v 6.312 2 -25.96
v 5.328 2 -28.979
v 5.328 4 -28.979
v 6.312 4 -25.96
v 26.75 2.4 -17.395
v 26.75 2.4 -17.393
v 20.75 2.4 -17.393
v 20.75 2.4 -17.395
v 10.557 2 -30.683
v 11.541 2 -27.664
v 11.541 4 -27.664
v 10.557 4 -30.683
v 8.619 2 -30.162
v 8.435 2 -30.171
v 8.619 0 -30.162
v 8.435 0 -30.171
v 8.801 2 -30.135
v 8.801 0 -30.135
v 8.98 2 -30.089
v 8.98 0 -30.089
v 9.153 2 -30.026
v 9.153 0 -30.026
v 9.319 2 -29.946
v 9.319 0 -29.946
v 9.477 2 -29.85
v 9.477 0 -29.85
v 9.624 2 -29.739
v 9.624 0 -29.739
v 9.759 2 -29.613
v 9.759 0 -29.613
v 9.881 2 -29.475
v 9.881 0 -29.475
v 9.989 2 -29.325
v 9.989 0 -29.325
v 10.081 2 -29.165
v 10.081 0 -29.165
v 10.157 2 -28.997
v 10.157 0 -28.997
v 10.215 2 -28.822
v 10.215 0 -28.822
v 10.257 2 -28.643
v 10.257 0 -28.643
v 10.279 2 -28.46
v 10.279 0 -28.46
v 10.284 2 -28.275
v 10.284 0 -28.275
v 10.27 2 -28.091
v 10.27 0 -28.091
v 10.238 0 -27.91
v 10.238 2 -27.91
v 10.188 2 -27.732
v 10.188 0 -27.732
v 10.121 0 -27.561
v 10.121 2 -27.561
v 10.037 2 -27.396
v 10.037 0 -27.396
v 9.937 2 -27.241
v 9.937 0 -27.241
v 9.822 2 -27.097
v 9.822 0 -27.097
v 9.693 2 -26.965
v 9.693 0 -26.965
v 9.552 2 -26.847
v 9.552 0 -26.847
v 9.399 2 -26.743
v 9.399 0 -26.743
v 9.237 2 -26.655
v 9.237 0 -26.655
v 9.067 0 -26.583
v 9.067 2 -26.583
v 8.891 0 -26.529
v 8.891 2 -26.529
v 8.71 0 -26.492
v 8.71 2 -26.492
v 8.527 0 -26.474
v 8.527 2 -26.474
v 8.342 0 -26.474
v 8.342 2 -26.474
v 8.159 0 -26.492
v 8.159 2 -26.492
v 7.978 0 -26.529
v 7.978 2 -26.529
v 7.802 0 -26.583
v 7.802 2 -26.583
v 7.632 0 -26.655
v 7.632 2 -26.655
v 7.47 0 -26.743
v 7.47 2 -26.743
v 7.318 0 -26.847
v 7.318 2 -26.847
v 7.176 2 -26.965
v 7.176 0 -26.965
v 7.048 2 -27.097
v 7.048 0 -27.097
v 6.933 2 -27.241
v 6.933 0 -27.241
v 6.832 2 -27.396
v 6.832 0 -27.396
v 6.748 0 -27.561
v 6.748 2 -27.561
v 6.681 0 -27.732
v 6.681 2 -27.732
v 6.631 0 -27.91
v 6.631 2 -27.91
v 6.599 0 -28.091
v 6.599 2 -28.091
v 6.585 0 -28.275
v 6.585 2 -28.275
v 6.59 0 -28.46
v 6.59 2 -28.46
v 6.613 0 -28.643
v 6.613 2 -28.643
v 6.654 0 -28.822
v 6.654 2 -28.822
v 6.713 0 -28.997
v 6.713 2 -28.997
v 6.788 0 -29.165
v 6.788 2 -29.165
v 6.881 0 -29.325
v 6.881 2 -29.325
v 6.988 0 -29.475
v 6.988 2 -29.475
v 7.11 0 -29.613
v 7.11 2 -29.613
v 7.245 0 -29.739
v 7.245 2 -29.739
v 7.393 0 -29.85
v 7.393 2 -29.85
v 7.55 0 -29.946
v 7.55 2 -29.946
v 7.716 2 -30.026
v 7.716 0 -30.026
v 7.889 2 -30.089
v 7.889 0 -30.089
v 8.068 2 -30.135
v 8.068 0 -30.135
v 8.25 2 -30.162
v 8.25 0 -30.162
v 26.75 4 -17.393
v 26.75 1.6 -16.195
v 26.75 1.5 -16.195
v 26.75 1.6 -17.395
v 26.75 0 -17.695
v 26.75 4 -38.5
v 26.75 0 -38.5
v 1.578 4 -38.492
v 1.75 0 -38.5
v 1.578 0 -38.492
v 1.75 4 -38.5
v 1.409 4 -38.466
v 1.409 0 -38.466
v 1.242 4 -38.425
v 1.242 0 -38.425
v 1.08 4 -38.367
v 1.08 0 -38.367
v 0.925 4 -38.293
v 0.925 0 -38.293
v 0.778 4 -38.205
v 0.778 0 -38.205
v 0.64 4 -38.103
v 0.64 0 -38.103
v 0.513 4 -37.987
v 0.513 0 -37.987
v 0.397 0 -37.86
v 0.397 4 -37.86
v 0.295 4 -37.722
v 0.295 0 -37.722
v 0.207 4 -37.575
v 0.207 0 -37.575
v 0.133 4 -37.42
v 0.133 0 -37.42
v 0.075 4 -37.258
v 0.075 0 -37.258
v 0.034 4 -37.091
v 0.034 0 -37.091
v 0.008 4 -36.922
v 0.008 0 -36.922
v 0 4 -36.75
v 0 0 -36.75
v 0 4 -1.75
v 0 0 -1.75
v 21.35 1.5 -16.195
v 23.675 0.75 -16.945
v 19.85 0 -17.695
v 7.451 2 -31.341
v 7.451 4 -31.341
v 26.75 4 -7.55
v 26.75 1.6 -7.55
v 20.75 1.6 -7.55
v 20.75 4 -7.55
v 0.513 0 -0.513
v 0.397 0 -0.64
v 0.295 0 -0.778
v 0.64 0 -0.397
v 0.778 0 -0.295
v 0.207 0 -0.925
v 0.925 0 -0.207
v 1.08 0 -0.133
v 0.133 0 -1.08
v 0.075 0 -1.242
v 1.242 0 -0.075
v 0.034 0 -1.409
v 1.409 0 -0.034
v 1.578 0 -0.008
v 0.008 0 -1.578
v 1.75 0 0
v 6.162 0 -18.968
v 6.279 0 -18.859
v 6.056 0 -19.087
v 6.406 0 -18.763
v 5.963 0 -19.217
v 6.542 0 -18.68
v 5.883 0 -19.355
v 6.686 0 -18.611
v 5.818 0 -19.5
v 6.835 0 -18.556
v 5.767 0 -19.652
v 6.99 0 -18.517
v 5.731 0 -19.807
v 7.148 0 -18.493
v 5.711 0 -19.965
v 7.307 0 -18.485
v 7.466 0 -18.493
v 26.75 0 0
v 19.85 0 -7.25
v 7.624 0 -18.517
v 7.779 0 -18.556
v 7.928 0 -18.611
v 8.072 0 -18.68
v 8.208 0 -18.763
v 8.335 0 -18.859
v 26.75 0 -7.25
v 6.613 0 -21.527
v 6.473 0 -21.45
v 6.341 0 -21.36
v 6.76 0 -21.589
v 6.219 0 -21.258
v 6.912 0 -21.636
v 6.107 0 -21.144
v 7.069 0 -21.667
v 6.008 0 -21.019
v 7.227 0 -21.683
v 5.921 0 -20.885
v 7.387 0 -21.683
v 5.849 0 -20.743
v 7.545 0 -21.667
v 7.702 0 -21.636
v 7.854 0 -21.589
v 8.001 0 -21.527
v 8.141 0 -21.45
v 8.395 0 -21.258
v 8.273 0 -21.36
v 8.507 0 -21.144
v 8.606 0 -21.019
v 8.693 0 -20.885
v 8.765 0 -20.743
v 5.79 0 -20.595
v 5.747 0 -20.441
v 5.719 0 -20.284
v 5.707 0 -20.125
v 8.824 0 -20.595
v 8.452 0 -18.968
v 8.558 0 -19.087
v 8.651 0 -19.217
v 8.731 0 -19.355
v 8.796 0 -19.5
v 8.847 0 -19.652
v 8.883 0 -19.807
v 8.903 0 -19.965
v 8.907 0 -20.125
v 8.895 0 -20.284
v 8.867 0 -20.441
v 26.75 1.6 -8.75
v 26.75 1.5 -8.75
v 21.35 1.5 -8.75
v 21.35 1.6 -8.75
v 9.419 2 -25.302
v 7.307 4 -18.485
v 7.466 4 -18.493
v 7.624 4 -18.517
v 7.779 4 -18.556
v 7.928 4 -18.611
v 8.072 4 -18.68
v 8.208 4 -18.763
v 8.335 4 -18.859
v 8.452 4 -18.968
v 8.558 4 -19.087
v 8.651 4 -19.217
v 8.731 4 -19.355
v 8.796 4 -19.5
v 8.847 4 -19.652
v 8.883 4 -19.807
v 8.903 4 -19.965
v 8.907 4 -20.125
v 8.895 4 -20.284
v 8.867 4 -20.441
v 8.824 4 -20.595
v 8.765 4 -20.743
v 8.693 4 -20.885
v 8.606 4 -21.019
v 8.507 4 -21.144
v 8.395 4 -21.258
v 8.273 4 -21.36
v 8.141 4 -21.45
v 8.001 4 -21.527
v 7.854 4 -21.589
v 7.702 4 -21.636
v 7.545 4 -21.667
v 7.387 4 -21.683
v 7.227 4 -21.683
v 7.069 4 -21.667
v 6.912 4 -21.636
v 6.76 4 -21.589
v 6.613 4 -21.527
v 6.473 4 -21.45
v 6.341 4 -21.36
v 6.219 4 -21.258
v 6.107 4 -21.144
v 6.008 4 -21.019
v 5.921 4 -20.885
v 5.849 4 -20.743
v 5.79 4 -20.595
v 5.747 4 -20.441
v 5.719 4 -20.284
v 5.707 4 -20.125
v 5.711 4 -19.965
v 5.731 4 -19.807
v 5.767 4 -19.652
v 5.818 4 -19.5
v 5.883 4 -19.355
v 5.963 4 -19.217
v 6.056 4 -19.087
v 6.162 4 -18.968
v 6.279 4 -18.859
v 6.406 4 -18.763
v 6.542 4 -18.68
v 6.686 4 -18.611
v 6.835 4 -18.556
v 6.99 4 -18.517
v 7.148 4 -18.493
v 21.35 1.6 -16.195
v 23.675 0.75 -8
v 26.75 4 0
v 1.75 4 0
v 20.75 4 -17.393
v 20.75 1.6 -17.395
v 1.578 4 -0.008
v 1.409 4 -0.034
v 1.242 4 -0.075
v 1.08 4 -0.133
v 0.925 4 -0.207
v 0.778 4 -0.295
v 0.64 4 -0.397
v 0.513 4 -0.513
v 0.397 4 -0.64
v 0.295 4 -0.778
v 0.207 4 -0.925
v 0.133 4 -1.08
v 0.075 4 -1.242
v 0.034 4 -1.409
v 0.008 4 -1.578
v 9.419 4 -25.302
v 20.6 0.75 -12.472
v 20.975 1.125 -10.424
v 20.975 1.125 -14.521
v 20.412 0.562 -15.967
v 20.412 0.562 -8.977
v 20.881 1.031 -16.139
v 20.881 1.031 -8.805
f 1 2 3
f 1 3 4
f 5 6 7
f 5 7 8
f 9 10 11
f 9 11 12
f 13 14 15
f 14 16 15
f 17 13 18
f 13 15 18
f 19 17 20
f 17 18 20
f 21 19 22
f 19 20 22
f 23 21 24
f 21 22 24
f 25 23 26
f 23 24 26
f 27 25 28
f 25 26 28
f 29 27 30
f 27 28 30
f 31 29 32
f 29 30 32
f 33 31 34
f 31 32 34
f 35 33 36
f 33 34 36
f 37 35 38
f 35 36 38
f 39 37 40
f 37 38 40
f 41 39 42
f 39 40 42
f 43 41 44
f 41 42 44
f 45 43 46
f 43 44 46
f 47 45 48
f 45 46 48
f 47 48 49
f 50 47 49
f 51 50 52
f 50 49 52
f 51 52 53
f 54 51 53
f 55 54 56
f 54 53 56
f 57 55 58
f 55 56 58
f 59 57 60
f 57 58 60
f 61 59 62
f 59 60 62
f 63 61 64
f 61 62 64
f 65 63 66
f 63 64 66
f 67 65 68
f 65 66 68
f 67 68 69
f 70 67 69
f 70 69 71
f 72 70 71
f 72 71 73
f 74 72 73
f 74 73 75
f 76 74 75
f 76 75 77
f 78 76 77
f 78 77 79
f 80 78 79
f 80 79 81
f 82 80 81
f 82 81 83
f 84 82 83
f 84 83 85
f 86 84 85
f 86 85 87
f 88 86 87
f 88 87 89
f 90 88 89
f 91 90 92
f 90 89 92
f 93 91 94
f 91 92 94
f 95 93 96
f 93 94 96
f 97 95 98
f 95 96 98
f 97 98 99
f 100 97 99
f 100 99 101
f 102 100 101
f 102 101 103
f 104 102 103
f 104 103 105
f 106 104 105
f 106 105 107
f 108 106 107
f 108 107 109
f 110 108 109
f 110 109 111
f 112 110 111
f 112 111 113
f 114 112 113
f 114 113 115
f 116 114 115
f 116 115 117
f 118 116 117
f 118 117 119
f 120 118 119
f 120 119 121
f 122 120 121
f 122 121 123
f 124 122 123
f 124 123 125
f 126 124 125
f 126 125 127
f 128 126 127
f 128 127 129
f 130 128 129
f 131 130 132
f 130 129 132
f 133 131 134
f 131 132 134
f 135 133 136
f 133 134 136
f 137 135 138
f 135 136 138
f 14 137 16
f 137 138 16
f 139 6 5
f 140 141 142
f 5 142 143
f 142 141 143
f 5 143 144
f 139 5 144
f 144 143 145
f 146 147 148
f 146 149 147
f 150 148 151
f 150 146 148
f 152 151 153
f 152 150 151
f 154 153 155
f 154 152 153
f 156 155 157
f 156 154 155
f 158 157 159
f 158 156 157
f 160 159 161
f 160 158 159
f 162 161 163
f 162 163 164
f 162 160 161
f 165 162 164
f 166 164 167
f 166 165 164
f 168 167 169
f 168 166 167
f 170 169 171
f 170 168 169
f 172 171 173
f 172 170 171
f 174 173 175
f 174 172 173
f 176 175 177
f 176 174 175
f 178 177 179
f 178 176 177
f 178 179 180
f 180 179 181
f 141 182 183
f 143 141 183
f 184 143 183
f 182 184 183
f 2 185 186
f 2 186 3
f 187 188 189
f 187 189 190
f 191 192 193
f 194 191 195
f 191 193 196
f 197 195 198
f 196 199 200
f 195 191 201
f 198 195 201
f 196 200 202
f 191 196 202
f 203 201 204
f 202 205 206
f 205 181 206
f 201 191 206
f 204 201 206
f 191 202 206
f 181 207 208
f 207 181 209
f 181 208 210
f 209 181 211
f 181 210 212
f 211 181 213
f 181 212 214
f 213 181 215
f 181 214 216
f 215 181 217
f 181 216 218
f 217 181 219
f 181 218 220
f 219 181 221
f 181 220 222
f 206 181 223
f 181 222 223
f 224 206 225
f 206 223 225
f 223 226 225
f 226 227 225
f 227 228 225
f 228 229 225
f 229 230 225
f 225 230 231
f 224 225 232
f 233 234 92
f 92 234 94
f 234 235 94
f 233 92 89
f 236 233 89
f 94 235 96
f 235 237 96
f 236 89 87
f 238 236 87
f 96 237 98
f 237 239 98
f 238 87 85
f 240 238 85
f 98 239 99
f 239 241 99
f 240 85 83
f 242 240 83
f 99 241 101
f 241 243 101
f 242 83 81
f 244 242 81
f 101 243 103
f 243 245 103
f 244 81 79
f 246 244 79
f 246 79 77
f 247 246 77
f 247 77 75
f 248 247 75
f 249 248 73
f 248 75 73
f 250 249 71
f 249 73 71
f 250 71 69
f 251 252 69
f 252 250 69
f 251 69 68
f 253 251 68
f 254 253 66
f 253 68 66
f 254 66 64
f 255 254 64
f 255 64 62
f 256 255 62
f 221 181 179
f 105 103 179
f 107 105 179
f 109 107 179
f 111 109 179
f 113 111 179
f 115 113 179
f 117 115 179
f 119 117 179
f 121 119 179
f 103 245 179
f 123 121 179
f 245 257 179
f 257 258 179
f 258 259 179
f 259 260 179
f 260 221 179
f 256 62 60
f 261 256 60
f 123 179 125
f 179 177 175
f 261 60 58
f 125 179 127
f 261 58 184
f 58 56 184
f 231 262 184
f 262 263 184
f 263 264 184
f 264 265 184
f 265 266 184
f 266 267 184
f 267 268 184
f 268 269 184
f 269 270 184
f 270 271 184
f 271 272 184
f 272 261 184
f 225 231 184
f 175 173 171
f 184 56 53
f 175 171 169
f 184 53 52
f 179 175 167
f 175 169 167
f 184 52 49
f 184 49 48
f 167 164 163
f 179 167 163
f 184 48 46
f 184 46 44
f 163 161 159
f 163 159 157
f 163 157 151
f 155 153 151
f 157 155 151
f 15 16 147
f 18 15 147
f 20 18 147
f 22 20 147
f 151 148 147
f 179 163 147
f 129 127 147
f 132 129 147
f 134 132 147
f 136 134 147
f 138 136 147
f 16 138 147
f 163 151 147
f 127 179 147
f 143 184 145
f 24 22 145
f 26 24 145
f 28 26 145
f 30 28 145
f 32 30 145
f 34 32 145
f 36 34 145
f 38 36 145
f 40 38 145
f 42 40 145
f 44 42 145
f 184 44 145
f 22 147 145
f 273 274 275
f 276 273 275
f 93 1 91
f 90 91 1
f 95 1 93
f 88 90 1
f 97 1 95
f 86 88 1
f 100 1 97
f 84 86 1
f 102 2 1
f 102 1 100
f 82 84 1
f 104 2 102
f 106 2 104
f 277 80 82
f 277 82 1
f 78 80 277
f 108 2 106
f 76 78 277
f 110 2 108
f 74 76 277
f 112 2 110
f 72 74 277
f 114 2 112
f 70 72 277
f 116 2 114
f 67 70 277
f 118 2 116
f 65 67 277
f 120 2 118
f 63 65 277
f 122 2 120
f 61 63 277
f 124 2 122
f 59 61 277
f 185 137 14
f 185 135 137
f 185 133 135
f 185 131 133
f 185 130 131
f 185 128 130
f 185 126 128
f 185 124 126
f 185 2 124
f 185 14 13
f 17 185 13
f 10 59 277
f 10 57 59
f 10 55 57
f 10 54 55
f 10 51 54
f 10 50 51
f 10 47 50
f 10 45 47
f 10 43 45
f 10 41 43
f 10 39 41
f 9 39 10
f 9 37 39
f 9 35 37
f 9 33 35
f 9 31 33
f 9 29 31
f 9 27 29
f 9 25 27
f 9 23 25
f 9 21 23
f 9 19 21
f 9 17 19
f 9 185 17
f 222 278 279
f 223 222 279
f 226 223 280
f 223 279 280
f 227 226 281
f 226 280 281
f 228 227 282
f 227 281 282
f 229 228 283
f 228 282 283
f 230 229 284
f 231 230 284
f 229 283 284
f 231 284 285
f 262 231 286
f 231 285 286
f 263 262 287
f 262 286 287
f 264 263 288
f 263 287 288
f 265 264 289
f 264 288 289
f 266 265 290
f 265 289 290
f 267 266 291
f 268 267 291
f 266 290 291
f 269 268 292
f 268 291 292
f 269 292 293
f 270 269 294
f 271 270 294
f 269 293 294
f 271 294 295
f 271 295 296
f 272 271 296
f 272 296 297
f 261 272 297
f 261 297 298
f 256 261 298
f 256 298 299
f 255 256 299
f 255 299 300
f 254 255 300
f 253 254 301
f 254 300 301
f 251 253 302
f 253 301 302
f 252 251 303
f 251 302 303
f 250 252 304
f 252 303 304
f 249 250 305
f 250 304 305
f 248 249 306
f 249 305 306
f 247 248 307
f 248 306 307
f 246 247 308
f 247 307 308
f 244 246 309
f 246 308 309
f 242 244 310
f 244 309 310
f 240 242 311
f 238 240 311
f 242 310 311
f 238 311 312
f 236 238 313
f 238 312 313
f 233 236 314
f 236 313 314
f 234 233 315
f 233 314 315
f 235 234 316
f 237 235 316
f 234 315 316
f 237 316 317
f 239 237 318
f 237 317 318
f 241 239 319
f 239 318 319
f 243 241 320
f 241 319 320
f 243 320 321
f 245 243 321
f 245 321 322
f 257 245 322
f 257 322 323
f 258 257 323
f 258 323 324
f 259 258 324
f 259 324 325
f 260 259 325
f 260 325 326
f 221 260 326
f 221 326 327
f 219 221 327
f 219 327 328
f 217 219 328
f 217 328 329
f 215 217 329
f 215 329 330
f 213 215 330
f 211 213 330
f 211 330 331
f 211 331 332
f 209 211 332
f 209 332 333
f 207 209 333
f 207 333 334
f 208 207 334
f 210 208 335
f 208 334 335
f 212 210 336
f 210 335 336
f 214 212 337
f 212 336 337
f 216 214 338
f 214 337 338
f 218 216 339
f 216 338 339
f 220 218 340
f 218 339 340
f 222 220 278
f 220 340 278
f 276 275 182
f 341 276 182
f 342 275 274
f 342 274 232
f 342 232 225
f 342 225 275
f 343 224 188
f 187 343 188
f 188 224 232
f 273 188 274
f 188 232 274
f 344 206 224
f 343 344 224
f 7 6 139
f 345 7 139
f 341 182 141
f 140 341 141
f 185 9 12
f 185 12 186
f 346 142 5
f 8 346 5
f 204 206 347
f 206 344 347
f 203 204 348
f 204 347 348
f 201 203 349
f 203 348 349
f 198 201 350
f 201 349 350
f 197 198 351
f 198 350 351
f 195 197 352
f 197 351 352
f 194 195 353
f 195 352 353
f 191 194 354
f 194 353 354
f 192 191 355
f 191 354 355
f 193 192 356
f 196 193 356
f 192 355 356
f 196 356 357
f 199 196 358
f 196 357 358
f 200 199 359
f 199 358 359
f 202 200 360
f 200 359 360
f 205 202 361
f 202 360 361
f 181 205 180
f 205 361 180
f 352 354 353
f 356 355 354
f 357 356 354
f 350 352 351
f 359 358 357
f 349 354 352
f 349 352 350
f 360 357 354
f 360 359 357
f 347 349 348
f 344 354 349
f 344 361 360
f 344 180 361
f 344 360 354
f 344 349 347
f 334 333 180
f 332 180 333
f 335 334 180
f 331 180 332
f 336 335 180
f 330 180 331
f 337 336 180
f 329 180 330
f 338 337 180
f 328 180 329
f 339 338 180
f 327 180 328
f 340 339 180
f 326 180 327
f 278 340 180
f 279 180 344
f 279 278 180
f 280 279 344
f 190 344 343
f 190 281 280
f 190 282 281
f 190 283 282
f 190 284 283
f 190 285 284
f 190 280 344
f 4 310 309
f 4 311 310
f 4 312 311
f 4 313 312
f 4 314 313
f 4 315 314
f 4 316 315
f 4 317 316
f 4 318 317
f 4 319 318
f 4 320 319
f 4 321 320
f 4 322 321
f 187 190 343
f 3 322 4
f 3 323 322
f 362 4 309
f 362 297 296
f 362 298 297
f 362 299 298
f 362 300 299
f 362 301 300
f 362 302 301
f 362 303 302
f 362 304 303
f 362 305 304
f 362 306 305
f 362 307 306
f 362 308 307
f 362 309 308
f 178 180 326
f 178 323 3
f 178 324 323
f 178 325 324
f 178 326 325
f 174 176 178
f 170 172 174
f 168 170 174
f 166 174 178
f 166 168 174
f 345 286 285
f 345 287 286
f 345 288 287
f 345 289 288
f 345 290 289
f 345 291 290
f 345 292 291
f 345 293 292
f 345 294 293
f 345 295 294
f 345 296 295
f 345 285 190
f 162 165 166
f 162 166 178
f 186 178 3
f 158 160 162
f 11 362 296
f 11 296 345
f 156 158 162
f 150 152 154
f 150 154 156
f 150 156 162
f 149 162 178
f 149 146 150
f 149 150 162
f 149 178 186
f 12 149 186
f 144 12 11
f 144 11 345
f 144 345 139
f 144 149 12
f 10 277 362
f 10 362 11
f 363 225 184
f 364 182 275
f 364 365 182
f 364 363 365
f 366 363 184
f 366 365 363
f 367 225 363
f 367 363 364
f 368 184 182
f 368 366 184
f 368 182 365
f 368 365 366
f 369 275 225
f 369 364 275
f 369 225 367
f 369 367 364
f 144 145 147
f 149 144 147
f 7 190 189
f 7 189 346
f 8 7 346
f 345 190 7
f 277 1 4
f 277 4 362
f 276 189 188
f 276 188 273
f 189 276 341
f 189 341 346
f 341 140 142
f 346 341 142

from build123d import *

# Parameters (mm, degrees)
BOSS_EXTRUDE1_DEPTH = 4
SKETCH2_W           = 9.844621866
SKETCH2_H           = 0.8
CUT_EXTRUDE1_DEPTH  = 6
SKETCH3_W           = 9.843082996
SKETCH3_H           = 1.6
CUT_EXTRUDE2_DEPTH  = 6
SKETCH5_R           = 1.6
CUT_EXTRUDE4_DEPTH  = 4
FILLET1_R           = 1.75
SKETCH10_R          = 1.85
CUT_EXTRUDE7_DEPTH  = 4
CAVITY2_START       = 2
CAVITY2_OUTLINE_R   = 1.85
CAVITY2_DEPTH       = 3


with BuildPart() as part:
    # Sketch1 → Boss-Extrude1 (new body)
    with BuildSketch(Plane(origin=(0, 0, 0), x_dir=(1, 0, 0), z_dir=(0, 1, 0))):
        Polygon((26.75, 16.194621866), (26.75, 38.5), (0, 38.5), (0, 0), (26.75, 0), (26.75, 8.75), (21.35, 8.75), (21.35, 16.194621866), align=None)
    extrude(amount=BOSS_EXTRUDE1_DEPTH)

    # Sketch2 → Cut-Extrude1 (cut)
    with BuildSketch(Plane(origin=(26.75, 0, 0), x_dir=(0, 0, -1), z_dir=(1, 0, 0))):
        with Locations((12.472310933, 2)):
            Rectangle(SKETCH2_W, SKETCH2_H)
    extrude(amount=-CUT_EXTRUDE1_DEPTH, mode=Mode.SUBTRACT)

    # Sketch3 → Cut-Extrude2 (cut)
    with BuildSketch(Plane(origin=(26.75, 0, 0), x_dir=(0, 0, -1), z_dir=(1, 0, 0))):
        with Locations((12.471541498, 3.2)):
            Rectangle(SKETCH3_W, SKETCH3_H)
    extrude(amount=-CUT_EXTRUDE2_DEPTH, mode=Mode.SUBTRACT)

    # Sketch5 → Cut-Extrude4 (cut)
    with BuildSketch(Plane(origin=(0, 4, 0), x_dir=(1, 0, 0), z_dir=(0, 1, 0))):
        with Locations(Location((7.307, 20.085, 0), (0, 0, 270))):
            Circle(SKETCH5_R)
    extrude(amount=-CUT_EXTRUDE4_DEPTH, mode=Mode.SUBTRACT)

    # Chamfer1: read off the stored shape, not the designer's step
    # Chamfer1: loft between two sections, ruled curve by curve
    chamfer1_from = [
        Edge.make_line((21.35, 1.5, -16.194621866), (21.35, 1.5, -8.75)),
        Edge.make_line((21.35, 1.5, -8.75), (26.75, 1.5, -8.75)),
        Edge.make_line((21.35, 1.5, -16.194621866), (26.75, 1.5, -16.194621866)),
        Edge.make_line((26.75, 1.5, -16.194621866), (26.75, 1.5, -8.75)),
    ]
    chamfer1_to = [
        Edge.make_line((19.85, 0, -17.694621866), (19.85, 0, -7.25)),
        Edge.make_line((19.85, 0, -7.25), (26.75, 0, -7.25)),
        Edge.make_line((19.85, 0, -17.694621866), (26.75, 0, -17.694621866)),
        Edge.make_line((26.75, 0, -17.694621866), (26.75, 0, -7.25)),
    ]
    chamfer1 = Solid(Shell([*[Face.make_surface_from_curves(chamfer1_from[k], chamfer1_to[k]) for k in range(4)], Face(Wire(chamfer1_from)), Face(Wire(chamfer1_to))]))
    add(chamfer1, mode=Mode.SUBTRACT)

    # Fillet1
    fillet1_edges = [part.edges().sort_by_distance(p)[0] for p in [
        (0, 2, -38.5),
        (0, 2, 0),
    ]]
    fillet(fillet1_edges, radius=FILLET1_R)

    # Sketch10 → Cut-Extrude7 (cut)
    with BuildSketch(Plane(origin=(0, 0, 0), x_dir=(-1, 0, 0), z_dir=(0, -1, 0))):
        with Locations(Location((-8.434644349, 28.321384576, 0), (0, 0, 90))):
            Circle(SKETCH10_R)
    extrude(amount=-CUT_EXTRUDE7_DEPTH, mode=Mode.SUBTRACT)

    # Cavity2: read off the stored shape, not the designer's step
    # Cavity2 outline → Cavity2 (cut)
    with BuildSketch(Plane(origin=(0, 0, 0), x_dir=(1, 0, 0), z_dir=(0, 1, 0)).offset(CAVITY2_START)):
        Polygon((11.54125505, 27.663886828), (10.557359451, 30.683039489), (7.450748751, 31.340537236), (5.328033648, 28.978882323), (6.311929246, 25.959729663), (9.418539947, 25.302231916), align=None)
        with Locations((8.434644349, 28.321384576)):
            Circle(CAVITY2_OUTLINE_R, mode=Mode.SUBTRACT)
    extrude(amount=CAVITY2_DEPTH, mode=Mode.SUBTRACT)


solid = part.part
